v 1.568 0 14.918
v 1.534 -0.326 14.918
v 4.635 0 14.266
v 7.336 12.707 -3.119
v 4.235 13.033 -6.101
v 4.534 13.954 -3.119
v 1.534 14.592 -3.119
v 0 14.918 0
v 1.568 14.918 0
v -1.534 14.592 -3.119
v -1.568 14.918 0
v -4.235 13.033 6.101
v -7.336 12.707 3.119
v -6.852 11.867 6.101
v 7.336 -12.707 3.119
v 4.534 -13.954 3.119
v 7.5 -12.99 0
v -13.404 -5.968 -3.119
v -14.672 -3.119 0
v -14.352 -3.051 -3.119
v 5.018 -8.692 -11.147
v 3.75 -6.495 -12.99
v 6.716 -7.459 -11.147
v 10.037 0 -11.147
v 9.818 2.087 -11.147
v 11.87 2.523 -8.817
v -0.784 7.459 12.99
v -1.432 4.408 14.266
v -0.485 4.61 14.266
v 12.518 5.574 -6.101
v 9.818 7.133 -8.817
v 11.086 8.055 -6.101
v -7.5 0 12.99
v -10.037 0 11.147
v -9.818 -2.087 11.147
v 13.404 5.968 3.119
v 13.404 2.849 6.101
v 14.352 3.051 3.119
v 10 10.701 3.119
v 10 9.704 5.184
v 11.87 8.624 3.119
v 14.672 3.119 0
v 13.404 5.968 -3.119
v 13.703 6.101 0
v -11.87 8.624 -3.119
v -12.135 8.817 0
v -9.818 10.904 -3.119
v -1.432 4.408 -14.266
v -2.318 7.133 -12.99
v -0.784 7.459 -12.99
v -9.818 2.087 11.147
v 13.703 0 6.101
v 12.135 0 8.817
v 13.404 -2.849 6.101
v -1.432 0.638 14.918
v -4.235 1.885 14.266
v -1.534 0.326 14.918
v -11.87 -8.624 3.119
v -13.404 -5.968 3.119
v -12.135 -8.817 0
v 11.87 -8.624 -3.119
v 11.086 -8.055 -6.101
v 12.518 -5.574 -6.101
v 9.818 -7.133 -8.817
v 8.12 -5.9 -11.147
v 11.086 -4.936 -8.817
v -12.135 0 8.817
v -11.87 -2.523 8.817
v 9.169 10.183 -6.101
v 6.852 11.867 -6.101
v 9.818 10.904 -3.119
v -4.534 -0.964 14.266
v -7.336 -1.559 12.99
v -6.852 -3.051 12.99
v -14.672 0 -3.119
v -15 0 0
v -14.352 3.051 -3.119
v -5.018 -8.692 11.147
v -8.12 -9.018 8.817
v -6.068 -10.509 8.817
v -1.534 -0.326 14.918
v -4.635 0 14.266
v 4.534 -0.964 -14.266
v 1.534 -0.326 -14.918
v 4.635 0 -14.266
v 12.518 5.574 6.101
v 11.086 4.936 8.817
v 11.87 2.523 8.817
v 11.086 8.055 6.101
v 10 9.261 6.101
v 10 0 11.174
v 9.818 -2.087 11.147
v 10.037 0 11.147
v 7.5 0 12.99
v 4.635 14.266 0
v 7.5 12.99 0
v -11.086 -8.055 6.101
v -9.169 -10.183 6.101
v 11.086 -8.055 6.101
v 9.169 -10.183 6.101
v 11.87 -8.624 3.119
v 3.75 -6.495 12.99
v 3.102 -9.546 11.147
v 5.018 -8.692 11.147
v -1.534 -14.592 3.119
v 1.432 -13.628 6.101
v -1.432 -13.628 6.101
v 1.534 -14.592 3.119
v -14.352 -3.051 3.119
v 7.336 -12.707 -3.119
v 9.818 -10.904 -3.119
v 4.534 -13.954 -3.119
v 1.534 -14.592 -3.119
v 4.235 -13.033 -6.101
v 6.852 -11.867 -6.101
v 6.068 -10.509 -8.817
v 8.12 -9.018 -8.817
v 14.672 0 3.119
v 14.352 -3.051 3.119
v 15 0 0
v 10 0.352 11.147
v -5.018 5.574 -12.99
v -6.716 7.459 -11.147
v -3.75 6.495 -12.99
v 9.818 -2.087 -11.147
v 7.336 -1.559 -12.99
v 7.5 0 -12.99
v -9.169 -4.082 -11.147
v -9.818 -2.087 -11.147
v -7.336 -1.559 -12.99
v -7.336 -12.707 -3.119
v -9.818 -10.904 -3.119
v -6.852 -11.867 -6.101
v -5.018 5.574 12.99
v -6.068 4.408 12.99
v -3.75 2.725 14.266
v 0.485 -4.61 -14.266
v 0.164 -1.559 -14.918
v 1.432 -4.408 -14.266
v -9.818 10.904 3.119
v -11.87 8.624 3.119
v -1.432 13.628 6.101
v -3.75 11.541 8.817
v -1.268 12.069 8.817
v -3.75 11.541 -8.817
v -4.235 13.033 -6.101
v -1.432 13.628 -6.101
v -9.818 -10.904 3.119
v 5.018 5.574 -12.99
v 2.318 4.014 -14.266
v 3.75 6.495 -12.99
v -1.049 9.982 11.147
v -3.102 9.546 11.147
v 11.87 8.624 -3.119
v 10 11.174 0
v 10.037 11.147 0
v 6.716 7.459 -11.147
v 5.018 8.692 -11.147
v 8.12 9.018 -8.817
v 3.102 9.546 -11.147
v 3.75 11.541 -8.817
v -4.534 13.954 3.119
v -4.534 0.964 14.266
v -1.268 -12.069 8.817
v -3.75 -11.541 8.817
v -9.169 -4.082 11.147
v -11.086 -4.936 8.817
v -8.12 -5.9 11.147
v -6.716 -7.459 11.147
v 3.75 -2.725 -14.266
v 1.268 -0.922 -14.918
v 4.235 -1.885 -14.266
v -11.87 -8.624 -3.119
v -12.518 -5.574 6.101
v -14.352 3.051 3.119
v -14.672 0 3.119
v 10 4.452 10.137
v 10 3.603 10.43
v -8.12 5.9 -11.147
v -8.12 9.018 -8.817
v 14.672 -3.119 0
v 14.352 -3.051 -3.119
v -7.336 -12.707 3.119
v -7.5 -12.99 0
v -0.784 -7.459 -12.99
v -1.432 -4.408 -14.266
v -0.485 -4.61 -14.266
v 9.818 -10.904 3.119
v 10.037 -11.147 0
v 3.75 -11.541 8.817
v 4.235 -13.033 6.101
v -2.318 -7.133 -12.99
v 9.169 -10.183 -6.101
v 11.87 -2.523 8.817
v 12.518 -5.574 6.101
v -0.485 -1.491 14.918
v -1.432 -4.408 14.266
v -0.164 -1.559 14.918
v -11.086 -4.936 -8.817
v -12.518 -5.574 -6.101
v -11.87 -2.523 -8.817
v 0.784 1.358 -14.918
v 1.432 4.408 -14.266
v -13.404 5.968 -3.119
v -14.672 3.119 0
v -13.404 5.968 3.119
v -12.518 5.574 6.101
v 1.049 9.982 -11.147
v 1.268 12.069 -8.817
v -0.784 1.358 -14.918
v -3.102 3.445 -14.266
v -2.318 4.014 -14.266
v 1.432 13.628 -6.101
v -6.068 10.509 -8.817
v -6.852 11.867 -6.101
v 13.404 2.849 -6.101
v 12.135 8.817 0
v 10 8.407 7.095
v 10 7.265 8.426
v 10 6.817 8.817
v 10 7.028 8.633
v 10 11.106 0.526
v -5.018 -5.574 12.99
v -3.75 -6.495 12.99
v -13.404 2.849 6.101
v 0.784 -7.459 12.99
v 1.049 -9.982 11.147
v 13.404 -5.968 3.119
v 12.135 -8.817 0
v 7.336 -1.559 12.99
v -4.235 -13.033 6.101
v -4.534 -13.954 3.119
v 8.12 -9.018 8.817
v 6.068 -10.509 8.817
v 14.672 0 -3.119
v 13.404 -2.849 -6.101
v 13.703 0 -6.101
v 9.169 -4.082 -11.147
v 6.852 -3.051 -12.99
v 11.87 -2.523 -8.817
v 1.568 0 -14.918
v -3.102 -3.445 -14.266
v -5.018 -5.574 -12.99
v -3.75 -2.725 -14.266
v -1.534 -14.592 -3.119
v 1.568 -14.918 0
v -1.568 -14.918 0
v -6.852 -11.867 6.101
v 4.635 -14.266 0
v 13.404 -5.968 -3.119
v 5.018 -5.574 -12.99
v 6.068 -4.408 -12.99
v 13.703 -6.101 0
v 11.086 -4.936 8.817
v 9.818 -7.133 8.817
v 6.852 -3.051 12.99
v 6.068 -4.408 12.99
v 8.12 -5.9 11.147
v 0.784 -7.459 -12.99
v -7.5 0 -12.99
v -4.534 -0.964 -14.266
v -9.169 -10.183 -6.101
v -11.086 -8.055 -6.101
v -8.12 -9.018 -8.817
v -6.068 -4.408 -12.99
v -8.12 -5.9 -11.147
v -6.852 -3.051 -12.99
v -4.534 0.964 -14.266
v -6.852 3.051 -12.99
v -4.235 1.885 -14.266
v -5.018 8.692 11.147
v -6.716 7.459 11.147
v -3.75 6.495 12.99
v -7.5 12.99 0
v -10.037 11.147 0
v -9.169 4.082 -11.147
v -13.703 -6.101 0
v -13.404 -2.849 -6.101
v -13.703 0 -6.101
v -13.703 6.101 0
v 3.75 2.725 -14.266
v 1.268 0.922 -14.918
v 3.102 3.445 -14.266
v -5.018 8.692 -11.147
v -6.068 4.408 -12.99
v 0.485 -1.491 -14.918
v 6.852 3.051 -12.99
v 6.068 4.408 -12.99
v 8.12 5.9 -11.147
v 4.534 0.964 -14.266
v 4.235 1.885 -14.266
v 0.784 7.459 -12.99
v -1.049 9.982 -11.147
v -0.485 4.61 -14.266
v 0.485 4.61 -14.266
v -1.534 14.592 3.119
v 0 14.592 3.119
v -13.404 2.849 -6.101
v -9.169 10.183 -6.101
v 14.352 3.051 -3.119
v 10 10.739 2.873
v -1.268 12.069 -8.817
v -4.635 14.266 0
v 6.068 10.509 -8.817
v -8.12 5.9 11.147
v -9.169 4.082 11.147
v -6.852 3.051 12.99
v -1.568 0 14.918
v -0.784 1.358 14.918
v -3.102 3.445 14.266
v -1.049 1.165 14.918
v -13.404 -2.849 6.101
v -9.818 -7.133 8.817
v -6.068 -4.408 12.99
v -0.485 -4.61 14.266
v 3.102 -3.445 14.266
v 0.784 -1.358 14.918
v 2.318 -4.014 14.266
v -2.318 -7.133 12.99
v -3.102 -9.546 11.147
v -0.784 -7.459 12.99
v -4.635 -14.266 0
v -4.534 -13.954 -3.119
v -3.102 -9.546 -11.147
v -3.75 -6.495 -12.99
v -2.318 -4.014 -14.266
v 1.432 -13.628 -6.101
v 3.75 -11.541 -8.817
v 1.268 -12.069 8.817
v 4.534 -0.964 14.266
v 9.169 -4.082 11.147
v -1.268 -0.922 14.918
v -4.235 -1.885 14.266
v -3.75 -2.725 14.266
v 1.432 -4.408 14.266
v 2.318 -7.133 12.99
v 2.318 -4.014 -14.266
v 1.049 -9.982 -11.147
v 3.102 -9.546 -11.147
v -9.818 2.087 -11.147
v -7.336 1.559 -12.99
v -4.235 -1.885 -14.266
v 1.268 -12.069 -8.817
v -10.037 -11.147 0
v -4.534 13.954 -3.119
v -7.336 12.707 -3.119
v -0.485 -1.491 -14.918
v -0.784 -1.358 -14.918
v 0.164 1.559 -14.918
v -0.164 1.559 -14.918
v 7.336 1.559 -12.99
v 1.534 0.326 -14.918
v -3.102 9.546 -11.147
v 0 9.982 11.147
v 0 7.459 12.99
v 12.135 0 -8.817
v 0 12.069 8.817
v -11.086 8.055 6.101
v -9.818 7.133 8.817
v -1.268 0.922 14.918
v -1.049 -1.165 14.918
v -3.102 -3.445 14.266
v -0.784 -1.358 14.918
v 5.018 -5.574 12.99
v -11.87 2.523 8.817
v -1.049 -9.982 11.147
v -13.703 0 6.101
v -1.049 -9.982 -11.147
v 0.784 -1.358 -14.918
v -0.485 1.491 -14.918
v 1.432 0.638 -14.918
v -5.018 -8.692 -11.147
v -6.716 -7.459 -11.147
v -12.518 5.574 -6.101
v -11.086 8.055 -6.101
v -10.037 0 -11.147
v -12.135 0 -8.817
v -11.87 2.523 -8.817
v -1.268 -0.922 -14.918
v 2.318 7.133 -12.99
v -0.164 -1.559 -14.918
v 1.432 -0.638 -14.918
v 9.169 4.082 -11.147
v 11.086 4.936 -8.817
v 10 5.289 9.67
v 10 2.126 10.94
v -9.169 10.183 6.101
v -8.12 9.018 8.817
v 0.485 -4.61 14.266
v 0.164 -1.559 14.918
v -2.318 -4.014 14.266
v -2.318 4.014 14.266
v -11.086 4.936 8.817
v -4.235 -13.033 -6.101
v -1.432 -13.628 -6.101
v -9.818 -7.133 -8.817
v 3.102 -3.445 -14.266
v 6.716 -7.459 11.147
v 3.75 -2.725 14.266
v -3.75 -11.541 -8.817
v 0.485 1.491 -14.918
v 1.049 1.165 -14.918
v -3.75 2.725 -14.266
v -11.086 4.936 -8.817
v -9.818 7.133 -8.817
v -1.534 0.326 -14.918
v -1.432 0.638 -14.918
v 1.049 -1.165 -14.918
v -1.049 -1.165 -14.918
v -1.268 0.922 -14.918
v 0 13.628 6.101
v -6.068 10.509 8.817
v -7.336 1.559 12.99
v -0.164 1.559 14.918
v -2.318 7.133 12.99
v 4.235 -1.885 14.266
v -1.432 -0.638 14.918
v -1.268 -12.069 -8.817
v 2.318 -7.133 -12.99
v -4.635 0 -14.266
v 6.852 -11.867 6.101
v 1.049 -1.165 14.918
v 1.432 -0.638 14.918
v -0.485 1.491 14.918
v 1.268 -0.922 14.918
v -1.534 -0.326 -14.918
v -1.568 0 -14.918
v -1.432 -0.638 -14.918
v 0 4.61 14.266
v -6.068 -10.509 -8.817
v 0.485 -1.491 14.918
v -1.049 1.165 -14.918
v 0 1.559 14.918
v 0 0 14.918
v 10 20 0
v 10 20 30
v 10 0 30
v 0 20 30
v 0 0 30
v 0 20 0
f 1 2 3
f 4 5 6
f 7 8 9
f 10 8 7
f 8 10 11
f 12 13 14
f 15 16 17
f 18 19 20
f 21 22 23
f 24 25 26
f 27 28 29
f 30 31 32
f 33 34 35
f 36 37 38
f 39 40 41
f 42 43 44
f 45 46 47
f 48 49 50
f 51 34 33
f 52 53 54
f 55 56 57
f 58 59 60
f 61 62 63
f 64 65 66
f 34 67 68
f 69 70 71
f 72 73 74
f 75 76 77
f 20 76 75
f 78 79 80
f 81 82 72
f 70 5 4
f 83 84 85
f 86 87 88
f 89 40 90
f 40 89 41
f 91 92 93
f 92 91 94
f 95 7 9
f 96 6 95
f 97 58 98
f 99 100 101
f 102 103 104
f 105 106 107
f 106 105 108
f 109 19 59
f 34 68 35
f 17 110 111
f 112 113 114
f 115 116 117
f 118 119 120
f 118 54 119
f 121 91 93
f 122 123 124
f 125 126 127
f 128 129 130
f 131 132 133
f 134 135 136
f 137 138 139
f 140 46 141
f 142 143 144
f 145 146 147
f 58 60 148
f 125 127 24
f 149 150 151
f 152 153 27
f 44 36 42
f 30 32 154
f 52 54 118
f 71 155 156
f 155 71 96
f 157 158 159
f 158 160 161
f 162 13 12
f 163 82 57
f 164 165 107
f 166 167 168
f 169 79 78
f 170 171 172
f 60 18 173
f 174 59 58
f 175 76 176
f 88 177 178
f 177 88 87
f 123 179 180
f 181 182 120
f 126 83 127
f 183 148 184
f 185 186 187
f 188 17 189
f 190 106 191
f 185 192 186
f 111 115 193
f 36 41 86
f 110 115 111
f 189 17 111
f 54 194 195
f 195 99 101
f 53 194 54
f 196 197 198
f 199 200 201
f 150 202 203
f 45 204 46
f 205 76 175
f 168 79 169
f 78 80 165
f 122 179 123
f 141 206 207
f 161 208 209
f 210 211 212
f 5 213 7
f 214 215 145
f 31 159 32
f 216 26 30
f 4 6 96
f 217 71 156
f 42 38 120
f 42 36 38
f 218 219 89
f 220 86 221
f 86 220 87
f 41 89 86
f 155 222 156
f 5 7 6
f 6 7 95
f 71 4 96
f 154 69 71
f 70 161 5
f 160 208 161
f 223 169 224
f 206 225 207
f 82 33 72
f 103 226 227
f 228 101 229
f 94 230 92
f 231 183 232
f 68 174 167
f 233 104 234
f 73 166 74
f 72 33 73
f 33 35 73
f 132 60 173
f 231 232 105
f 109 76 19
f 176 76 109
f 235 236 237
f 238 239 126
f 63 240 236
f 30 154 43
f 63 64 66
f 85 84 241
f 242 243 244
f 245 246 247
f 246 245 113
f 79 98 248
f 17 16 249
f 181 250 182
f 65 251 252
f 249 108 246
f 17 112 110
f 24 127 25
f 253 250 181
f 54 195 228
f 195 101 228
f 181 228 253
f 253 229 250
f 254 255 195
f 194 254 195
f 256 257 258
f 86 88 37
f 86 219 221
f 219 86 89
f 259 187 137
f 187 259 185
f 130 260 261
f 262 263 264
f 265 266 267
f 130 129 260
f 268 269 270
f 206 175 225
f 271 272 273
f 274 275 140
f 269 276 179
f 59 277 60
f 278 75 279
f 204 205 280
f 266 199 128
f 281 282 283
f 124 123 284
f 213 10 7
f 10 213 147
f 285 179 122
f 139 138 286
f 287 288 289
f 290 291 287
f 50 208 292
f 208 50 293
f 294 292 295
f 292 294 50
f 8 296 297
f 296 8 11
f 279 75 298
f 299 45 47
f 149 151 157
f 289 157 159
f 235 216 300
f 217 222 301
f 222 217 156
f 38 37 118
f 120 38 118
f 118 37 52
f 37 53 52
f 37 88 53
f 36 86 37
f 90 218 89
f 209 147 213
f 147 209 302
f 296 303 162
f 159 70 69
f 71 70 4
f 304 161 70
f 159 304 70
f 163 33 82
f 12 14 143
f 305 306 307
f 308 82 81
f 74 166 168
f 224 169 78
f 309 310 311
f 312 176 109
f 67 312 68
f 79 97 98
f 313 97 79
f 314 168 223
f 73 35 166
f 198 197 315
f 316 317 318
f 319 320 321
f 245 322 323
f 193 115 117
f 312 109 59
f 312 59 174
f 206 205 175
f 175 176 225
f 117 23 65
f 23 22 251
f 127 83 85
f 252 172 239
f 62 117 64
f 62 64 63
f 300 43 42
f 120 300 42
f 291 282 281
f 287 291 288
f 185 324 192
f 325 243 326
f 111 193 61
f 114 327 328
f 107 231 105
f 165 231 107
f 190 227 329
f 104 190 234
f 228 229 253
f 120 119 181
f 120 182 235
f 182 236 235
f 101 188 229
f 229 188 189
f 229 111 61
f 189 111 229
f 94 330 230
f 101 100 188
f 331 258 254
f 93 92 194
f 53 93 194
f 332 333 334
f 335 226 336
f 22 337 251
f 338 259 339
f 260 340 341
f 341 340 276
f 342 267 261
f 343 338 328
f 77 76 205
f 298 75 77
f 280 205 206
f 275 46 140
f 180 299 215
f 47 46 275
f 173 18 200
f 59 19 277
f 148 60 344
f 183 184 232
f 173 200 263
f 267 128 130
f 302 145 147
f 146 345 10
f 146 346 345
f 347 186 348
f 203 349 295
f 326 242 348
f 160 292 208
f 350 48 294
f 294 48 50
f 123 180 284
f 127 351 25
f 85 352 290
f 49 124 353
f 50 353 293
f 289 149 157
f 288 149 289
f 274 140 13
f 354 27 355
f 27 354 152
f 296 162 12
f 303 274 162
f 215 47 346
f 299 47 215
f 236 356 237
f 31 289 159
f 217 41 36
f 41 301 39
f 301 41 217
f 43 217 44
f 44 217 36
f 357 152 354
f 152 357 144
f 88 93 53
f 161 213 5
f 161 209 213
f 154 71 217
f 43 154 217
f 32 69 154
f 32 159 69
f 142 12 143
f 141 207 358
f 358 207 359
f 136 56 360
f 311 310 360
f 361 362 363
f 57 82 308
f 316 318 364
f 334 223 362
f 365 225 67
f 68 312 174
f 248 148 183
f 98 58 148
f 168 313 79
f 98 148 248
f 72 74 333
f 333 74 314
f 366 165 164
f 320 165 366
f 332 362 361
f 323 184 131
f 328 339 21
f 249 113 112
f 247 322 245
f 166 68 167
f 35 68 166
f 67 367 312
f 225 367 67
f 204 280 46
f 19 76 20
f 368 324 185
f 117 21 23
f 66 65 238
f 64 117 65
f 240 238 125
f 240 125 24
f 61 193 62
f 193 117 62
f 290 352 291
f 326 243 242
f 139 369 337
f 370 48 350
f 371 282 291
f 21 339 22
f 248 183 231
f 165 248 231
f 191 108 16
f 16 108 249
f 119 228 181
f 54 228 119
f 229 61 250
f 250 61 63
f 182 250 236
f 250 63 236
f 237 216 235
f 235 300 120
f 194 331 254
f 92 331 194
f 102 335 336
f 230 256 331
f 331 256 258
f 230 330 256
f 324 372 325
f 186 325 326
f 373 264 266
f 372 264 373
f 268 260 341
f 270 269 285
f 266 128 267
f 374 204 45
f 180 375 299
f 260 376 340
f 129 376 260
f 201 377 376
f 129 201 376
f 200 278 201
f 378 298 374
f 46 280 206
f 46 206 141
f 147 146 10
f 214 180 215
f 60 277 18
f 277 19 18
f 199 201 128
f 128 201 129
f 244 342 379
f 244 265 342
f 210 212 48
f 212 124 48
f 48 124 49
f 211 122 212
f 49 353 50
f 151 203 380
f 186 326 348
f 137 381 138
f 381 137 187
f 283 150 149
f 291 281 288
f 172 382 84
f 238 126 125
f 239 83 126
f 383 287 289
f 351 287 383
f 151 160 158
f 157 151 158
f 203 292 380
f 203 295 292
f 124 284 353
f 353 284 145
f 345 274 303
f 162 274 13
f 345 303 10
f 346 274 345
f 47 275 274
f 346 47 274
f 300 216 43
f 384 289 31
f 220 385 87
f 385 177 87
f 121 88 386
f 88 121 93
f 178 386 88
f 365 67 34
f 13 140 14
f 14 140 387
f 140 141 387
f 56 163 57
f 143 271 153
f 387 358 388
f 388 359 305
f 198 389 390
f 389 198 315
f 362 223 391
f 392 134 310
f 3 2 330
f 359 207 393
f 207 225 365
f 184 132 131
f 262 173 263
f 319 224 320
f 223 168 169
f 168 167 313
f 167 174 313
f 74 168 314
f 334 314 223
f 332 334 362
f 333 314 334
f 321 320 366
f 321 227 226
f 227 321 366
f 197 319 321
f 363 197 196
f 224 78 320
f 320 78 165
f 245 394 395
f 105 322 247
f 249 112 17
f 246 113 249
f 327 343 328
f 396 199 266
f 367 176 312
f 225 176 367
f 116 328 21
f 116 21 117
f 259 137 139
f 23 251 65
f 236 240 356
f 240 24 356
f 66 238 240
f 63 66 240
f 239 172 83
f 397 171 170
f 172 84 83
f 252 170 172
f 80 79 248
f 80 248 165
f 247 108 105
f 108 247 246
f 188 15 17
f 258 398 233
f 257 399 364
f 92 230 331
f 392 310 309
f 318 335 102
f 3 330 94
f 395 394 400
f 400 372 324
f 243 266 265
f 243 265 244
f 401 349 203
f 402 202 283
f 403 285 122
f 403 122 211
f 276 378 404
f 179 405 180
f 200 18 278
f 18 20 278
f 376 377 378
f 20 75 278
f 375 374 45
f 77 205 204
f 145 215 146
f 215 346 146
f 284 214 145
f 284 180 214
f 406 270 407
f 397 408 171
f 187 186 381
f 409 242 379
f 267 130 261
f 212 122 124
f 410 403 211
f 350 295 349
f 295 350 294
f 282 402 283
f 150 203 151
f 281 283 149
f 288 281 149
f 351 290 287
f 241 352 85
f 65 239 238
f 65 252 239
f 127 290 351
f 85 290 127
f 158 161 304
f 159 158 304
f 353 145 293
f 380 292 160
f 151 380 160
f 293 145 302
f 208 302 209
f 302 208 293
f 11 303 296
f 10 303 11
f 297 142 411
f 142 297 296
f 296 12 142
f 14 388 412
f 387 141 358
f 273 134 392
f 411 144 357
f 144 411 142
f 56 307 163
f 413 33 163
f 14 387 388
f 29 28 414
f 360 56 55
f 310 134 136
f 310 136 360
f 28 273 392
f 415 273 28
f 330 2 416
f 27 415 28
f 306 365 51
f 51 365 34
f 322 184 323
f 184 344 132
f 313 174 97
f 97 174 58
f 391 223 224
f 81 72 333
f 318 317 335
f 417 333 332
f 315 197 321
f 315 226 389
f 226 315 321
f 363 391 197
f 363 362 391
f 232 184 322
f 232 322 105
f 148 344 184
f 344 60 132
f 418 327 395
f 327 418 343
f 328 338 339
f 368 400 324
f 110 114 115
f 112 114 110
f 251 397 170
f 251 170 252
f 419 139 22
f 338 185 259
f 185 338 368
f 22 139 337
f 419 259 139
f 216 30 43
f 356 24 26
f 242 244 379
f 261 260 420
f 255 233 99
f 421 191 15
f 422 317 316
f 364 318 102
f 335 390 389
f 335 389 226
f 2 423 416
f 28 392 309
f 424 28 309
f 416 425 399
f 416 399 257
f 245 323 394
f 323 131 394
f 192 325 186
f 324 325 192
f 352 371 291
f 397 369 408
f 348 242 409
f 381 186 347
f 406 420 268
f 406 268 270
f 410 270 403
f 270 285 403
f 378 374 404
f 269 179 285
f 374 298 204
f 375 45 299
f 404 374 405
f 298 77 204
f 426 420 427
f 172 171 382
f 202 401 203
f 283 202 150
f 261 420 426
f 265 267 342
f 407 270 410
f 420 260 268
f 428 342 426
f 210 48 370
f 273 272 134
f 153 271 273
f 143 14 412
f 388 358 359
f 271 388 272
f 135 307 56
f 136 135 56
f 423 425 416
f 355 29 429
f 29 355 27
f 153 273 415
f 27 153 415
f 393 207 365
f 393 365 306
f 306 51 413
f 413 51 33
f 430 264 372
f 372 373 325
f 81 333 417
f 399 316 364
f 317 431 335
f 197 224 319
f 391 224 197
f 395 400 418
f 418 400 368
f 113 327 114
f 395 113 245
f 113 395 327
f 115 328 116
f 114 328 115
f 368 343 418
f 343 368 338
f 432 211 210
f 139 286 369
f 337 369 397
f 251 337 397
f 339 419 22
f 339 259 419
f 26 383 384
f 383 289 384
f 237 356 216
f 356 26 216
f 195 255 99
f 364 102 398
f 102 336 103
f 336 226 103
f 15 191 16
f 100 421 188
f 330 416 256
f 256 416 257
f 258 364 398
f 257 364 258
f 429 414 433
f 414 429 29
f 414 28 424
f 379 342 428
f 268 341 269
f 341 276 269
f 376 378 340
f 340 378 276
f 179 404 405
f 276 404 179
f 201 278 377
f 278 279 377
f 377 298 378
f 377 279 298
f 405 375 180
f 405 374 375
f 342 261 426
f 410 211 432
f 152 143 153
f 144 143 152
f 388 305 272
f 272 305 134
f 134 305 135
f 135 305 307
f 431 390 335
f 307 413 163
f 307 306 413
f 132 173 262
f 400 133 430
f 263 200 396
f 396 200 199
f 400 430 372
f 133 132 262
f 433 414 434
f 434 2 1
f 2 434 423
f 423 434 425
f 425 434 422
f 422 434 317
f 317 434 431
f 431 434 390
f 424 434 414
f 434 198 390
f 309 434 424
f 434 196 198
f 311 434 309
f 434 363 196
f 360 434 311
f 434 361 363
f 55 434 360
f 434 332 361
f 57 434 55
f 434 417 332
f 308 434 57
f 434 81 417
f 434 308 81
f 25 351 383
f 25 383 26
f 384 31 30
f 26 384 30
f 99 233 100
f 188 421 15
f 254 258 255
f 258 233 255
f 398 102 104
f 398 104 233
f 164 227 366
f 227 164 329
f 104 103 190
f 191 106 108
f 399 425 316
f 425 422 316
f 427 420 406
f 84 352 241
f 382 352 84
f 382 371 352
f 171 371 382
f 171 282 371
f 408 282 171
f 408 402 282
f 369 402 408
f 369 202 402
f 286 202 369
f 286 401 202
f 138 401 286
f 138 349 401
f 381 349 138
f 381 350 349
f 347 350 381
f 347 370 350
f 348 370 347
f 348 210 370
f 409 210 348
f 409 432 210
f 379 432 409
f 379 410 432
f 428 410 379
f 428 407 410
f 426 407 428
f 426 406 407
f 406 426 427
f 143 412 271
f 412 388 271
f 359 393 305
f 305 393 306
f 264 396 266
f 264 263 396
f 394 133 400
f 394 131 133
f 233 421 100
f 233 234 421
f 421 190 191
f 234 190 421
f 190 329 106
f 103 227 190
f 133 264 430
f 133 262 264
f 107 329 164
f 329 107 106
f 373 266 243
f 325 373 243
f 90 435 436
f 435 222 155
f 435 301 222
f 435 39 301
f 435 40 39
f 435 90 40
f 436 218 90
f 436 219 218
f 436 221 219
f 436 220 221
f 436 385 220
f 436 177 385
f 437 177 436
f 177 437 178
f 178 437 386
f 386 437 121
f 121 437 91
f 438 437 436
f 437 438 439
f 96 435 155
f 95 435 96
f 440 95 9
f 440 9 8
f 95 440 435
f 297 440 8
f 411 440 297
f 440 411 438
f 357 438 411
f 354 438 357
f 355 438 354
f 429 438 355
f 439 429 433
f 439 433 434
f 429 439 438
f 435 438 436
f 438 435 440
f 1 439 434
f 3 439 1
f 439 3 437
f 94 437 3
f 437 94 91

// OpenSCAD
union() {
sphere(d=30);
cube(size=[10,20,30]);
}

/*
<json>
    {
        "Name": "Test Param 0",
        "Desc": "Use the slider to indicate how many columns printed acceptably.",
        "LowKeyword": "Lost",
        "HighKeyword": "Printed",
        "varBase": "TestParam0",
        "minDefault": 0.1,
        "maxDefault": 2,
        "minDefaultND": "0.5 * nozzleDiameter",
        "maxDefaultND": "5 * nozzleDiameter",
        "cameraData": "9.57,-17.9,8.45,57.8,0,314.8,85",
        "sortOrder": 0,
		"instanceCount": 10
    }
</json>
*/
